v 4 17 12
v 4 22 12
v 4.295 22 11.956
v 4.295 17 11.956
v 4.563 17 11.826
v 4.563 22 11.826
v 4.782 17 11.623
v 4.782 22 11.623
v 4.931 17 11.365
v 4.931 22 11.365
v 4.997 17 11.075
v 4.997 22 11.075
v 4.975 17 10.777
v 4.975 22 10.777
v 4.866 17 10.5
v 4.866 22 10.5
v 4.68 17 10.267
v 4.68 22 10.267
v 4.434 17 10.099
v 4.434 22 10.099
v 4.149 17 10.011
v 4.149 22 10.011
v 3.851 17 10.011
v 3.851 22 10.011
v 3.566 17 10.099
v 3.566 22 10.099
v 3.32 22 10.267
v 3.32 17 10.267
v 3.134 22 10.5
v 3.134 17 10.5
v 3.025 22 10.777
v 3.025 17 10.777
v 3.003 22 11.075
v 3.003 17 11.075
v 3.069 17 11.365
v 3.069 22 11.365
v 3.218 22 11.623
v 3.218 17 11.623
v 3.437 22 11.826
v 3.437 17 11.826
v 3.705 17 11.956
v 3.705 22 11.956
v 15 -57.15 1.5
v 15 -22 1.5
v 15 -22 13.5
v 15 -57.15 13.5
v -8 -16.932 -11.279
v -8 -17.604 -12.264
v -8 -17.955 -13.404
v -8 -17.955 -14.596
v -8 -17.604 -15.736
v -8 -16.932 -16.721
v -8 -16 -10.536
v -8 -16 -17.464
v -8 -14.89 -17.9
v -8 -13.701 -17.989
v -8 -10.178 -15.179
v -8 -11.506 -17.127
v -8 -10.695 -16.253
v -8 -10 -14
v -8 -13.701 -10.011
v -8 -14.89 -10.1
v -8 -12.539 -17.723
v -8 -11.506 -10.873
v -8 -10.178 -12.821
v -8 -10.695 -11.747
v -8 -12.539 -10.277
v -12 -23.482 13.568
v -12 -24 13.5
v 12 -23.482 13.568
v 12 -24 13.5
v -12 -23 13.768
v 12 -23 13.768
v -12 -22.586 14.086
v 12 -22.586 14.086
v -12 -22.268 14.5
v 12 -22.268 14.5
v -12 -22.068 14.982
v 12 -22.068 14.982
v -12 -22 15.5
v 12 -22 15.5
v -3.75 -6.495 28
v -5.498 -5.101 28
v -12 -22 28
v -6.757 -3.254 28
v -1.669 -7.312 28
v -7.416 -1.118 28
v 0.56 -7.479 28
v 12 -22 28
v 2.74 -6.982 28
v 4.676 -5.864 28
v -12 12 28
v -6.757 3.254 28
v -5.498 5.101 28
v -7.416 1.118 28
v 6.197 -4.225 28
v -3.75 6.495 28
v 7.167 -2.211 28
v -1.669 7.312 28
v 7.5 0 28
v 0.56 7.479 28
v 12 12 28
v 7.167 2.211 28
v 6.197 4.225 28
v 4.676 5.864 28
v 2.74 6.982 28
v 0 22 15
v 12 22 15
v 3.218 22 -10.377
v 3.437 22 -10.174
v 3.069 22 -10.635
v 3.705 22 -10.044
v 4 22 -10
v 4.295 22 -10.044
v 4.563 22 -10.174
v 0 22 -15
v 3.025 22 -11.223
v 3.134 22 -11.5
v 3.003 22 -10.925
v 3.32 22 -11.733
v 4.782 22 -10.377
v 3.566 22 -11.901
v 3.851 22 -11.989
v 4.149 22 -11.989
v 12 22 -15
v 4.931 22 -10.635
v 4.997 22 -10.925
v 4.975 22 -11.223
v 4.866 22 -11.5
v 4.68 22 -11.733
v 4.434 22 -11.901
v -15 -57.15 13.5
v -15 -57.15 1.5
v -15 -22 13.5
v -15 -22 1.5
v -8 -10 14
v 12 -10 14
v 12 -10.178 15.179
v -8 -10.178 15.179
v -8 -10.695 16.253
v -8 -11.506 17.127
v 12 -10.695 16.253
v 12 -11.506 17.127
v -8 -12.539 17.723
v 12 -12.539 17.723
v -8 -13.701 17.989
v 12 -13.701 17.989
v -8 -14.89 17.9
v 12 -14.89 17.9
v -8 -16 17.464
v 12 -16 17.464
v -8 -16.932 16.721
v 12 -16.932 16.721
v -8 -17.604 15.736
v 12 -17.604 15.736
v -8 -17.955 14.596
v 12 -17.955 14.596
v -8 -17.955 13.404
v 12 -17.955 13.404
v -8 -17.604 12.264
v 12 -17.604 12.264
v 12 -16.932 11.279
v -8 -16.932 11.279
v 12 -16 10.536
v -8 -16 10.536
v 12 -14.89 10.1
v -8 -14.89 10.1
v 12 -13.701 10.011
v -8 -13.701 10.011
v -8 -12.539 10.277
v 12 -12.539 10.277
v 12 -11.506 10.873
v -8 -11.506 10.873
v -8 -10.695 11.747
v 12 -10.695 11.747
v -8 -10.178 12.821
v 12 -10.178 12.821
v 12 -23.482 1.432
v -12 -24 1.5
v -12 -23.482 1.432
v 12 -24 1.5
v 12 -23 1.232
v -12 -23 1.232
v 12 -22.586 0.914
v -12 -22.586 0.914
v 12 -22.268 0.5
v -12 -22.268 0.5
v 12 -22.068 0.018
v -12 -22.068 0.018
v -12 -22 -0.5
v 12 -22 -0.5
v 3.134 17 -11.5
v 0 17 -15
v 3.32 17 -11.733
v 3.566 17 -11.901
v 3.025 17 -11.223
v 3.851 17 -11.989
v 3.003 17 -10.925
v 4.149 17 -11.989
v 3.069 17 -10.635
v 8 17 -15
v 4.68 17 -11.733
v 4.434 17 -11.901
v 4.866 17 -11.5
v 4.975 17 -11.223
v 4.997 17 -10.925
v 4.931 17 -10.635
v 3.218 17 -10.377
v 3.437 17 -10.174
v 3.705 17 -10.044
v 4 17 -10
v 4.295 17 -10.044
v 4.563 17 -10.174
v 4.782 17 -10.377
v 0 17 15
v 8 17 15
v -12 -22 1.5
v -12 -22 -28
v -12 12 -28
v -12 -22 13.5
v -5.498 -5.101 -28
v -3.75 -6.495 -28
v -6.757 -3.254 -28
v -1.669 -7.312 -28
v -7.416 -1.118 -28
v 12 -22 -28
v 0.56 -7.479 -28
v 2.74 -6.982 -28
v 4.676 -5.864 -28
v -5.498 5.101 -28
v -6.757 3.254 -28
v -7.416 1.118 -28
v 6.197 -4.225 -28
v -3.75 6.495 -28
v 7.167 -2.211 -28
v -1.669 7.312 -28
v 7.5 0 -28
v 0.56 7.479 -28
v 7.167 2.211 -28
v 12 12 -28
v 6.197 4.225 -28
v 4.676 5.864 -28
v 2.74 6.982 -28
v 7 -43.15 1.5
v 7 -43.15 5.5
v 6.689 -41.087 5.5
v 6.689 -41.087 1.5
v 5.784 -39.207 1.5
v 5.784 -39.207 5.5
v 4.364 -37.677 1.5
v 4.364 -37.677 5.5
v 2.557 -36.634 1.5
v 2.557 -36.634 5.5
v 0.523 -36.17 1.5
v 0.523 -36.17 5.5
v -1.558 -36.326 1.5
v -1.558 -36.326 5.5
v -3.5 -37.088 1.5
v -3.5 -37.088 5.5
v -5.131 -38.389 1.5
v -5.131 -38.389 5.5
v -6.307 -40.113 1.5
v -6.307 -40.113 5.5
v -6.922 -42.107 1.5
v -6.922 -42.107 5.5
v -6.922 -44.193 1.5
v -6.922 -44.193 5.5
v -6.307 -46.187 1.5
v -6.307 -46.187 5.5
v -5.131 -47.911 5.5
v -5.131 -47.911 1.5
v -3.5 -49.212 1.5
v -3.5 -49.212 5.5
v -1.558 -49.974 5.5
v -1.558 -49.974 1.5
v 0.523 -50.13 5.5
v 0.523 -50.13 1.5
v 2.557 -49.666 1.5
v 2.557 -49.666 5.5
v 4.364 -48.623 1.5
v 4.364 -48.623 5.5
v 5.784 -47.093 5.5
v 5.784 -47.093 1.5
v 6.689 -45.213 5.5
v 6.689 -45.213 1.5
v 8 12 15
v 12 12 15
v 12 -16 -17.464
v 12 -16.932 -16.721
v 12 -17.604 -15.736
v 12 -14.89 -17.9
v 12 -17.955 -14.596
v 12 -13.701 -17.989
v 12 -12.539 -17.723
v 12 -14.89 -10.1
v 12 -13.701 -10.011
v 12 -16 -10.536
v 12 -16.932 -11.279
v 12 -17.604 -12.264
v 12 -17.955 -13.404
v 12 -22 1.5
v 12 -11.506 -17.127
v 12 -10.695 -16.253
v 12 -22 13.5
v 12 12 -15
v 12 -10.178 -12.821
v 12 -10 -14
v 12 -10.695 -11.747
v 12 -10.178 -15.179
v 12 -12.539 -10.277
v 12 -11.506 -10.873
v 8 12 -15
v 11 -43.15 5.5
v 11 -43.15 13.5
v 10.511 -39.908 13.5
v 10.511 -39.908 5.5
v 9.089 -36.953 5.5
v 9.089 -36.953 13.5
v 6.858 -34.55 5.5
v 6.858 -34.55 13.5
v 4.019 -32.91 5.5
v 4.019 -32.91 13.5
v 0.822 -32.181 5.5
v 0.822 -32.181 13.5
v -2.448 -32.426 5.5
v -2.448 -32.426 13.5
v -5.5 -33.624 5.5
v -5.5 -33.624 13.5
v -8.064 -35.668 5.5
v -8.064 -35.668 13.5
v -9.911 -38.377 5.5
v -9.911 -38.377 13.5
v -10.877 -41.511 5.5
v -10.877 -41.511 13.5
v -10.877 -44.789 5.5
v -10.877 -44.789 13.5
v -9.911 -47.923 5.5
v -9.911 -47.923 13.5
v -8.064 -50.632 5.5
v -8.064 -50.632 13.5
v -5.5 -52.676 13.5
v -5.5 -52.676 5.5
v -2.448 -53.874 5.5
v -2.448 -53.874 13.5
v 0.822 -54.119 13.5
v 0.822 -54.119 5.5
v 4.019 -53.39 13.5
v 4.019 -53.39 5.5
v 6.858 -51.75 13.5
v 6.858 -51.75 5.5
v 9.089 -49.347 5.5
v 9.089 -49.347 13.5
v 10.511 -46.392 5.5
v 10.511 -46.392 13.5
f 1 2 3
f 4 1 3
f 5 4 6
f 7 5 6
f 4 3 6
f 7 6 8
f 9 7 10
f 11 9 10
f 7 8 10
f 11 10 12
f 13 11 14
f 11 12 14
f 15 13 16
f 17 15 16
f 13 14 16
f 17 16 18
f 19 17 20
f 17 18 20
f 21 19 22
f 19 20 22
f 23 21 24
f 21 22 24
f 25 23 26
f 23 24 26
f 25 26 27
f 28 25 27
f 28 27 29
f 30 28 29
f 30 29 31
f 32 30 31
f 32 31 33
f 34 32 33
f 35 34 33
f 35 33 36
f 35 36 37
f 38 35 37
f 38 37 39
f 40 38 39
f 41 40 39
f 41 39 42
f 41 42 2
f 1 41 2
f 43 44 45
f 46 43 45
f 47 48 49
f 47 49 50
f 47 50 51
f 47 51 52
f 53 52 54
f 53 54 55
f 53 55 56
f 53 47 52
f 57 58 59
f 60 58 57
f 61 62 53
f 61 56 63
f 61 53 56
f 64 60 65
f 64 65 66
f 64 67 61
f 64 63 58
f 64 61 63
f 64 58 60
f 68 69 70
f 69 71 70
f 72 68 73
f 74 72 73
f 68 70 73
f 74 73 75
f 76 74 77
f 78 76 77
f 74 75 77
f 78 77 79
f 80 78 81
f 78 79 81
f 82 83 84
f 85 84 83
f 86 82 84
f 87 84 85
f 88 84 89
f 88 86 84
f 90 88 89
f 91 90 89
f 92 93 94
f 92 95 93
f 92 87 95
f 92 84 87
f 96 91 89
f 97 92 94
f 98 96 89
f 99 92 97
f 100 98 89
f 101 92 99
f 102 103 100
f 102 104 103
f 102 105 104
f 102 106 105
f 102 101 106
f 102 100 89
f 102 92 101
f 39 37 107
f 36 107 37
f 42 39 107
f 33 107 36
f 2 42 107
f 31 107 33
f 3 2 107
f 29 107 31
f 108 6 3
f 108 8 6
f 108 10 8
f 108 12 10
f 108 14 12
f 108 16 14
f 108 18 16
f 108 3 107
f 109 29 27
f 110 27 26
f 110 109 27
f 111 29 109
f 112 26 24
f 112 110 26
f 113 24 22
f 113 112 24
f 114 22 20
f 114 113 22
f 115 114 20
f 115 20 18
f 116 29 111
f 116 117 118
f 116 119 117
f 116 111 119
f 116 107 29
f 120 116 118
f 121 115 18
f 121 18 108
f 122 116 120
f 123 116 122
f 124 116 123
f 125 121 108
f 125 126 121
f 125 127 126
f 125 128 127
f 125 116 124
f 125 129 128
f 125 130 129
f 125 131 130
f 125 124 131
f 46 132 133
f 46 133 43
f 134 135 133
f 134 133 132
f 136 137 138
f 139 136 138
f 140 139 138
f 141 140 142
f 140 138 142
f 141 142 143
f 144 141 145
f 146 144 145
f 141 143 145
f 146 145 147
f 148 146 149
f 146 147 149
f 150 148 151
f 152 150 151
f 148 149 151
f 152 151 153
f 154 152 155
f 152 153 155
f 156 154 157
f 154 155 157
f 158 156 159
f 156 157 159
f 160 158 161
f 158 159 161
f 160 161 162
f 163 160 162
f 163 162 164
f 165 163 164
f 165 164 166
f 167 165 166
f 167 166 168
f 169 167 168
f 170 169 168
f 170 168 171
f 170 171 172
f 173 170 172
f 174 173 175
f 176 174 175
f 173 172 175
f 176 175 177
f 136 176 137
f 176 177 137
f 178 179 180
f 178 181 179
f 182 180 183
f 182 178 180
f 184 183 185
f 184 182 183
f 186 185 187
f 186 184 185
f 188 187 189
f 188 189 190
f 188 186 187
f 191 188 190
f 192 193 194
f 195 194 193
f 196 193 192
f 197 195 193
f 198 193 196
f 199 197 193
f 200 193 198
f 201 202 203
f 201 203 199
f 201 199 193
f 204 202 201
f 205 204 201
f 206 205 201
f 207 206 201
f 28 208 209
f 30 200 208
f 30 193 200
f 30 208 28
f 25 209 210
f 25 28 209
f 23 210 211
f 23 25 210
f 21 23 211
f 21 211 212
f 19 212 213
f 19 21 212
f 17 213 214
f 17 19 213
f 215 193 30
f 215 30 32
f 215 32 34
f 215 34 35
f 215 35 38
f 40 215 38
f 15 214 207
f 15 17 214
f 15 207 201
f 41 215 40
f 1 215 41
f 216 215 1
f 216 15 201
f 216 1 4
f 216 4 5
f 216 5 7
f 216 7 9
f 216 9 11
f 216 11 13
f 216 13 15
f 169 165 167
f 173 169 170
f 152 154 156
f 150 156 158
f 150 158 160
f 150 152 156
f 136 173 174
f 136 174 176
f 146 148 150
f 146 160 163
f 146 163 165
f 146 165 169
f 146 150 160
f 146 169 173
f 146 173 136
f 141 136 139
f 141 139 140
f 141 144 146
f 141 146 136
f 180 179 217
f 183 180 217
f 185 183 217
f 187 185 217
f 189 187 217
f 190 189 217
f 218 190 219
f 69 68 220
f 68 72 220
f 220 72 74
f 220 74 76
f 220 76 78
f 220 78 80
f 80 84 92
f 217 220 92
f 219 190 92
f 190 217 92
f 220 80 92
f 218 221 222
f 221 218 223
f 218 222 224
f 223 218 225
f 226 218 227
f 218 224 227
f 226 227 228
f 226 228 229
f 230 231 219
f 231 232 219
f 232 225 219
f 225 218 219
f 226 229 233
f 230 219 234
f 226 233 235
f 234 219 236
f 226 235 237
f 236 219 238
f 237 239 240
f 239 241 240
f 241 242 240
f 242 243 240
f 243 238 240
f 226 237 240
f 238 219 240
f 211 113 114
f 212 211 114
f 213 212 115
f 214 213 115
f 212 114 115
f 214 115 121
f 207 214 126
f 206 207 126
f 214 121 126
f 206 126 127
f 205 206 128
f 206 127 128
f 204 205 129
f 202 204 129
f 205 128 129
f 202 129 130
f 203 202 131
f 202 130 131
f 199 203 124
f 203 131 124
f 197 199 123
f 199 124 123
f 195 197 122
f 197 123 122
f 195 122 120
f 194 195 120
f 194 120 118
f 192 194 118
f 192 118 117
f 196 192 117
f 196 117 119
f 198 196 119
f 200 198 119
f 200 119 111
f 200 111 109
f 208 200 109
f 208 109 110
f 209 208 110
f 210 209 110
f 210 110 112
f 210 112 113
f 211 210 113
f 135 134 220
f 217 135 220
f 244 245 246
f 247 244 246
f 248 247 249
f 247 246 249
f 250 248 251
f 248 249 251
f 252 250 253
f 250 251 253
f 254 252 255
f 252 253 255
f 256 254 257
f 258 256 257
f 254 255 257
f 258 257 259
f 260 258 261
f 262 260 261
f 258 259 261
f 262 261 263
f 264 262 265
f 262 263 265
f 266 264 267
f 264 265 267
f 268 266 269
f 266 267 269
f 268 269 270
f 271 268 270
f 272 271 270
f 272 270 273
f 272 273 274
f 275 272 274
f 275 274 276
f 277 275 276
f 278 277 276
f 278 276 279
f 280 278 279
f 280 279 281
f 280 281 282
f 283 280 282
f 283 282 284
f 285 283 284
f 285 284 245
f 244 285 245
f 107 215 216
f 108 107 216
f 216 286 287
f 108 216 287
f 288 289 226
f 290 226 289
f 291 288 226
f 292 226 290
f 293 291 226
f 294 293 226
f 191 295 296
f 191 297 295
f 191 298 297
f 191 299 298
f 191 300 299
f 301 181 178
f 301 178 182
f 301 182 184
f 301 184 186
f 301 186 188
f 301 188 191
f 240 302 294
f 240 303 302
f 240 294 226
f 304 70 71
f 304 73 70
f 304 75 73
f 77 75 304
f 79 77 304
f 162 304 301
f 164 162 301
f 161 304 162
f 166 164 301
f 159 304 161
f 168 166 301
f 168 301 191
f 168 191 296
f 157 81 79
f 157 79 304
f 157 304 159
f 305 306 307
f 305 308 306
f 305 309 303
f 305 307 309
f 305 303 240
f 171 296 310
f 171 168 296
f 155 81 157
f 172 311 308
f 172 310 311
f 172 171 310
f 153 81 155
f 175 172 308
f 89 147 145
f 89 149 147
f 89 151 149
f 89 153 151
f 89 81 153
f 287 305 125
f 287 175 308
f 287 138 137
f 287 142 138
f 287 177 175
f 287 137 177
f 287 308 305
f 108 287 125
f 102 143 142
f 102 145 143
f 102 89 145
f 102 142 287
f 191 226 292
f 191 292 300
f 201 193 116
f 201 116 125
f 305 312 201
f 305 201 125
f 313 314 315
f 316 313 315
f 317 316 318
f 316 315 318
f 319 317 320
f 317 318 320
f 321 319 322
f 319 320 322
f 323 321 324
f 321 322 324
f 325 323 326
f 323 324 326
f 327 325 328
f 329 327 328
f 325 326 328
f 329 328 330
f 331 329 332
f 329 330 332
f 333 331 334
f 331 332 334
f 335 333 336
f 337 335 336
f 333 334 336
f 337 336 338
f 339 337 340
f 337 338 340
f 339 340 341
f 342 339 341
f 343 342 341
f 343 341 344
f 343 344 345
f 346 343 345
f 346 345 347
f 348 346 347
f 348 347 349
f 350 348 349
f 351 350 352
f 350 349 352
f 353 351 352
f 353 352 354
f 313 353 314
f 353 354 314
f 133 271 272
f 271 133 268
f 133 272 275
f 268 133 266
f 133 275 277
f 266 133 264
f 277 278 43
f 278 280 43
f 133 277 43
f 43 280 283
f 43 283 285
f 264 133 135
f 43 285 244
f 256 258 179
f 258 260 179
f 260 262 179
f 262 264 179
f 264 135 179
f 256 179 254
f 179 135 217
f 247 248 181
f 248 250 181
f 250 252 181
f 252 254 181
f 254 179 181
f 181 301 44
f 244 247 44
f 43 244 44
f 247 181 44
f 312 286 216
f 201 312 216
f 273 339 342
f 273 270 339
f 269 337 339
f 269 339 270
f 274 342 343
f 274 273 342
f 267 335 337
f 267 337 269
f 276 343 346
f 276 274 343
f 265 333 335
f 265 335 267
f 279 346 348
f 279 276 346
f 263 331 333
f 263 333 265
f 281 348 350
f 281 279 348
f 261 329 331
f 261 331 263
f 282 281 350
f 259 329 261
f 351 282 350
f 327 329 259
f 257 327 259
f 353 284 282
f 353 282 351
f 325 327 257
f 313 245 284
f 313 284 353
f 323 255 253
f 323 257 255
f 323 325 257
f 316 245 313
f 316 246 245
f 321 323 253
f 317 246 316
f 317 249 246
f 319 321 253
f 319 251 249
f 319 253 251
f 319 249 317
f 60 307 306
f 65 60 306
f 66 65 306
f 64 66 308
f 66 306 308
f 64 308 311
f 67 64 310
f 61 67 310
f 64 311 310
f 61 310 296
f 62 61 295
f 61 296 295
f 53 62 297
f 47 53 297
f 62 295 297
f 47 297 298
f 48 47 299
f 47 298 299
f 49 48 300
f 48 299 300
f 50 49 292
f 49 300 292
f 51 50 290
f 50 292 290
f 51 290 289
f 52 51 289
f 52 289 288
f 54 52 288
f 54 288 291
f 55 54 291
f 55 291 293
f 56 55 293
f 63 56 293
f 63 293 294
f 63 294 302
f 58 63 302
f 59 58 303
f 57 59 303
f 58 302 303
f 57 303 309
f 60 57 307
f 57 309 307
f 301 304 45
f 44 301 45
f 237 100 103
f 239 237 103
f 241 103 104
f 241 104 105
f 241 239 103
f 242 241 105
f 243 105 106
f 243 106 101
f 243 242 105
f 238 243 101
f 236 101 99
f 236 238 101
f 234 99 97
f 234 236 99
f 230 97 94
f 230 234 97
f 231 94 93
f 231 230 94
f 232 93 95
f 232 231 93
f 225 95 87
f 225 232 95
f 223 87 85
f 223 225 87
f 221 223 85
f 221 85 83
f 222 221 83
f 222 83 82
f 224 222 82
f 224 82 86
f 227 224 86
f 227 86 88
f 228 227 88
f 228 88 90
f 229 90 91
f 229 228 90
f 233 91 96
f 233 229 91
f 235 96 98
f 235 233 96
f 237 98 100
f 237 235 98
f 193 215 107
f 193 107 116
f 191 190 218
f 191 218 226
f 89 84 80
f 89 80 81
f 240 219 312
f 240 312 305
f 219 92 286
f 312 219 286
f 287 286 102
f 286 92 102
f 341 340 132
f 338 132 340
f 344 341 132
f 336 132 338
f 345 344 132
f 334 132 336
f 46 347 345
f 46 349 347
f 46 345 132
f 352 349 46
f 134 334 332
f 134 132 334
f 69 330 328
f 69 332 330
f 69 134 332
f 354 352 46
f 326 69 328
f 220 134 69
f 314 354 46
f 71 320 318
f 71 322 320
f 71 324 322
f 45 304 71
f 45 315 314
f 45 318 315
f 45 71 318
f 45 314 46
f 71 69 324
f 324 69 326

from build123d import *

# Parameters (mm, degrees)
SKETCH1_W           = 24
SKETCH1_H           = 34
SKETCH1_R           = 7.5
BOSS_EXTRUDE1_DEPTH = 28
SKETCH3_W           = 30
SKETCH3_H           = 12
BOSS_EXTRUDE2_DEPTH = 35.15
SKETCH4_R           = 11
CUT_EXTRUDE2_DEPTH  = 8
FILLET1_R           = 2
SKETCH5_W           = 12
SKETCH5_H           = 30
BOSS_EXTRUDE3_DEPTH = 10
SKETCH6_W           = 8
SKETCH6_H           = 5
CUT_EXTRUDE3_DEPTH  = 74.076141797
CUT_EXTRUDE4_REACH  = 87.286
SKETCH7_R           = 1
SKETCH8_R           = 4
CUT_EXTRUDE5_DEPTH  = 20
SKETCH9_R           = 7
CUT_EXTRUDE6_DEPTH  = 10


with BuildPart() as part:
    # Sketch1 → Boss-Extrude1 (new, symmetric)
    with BuildSketch(Plane.XY):
        with Locations((0, -5)):
            Rectangle(SKETCH1_W, SKETCH1_H)
        Circle(SKETCH1_R, mode=Mode.SUBTRACT)
    extrude(amount=BOSS_EXTRUDE1_DEPTH, both=True)

    # Sketch3 → Boss-Extrude2 (add)
    with BuildSketch(Plane.XZ.offset(22)):
        with Locations((0, 7.5)):
            Rectangle(SKETCH3_W, SKETCH3_H)
    extrude(amount=BOSS_EXTRUDE2_DEPTH)

    # Sketch4 → Cut-Extrude2 (cut)
    with BuildSketch(Plane.XY.offset(13.5)):
        with Locations((0, -43.15)):
            Circle(SKETCH4_R)
    extrude(amount=-CUT_EXTRUDE2_DEPTH, mode=Mode.SUBTRACT)

    # Fillet1
    fillet1_edges = [part.edges().sort_by_distance(p)[0] for p in [
        (0, -22, 1.5),
        (0, -22, 13.5),
    ]]
    fillet(fillet1_edges, radius=FILLET1_R)

    # Sketch5 → Boss-Extrude3 (add)
    with BuildSketch(Plane(origin=(0, 12, 0), x_dir=(1, 0, 0), z_dir=(0, 1, 0))):
        with Locations((6, 0)):
            Rectangle(SKETCH5_W, SKETCH5_H)
    extrude(amount=BOSS_EXTRUDE3_DEPTH)

    # Sketch6 → Cut-Extrude3 (cut, through all)
    with BuildSketch(Plane.XY.offset(15)):
        with Locations((4, 14.5)):
            Rectangle(SKETCH6_W, SKETCH6_H)
    extrude(amount=-CUT_EXTRUDE3_DEPTH, mode=Mode.SUBTRACT)

    # Sketch7 → Cut-Extrude4 (cut, up to next)
    with BuildSketch(Plane(origin=(0, 22, 0), x_dir=(1, 0, 0), z_dir=(0, 1, 0)), mode=Mode.PRIVATE) as cut_extrude4_sk1:
        with Locations(Location((4, 11, 0), (0, 0, 270))):
            Circle(SKETCH7_R)
    cut_extrude4_tool1 = extrude(cut_extrude4_sk1.sketch, amount=-CUT_EXTRUDE4_REACH, mode=Mode.PRIVATE) & part.part
    # Sketch7 → Cut-Extrude4 (cut, up to next)
    with BuildSketch(Plane(origin=(0, 22, 0), x_dir=(1, 0, 0), z_dir=(0, 1, 0)), mode=Mode.PRIVATE) as cut_extrude4_sk2:
        with Locations(Location((4, -11, 0), (0, 0, 270))):
            Circle(SKETCH7_R)
    cut_extrude4_tool2 = extrude(cut_extrude4_sk2.sketch, amount=-CUT_EXTRUDE4_REACH, mode=Mode.PRIVATE) & part.part
    add(cut_extrude4_tool1.solids().sort_by_distance((4, 22, -11))[0], mode=Mode.SUBTRACT)
    add(cut_extrude4_tool2.solids().sort_by_distance((4, 22, 11))[0], mode=Mode.SUBTRACT)

    # Sketch8 → Cut-Extrude5 (cut)
    with BuildSketch(Plane(origin=(12, 0, 0), x_dir=(0, 0, -1), z_dir=(1, 0, 0))):
        with Locations(Location((-14, -14, 0), (0, 0, 90))):
            Circle(SKETCH8_R)
        with Locations(Location((14, -14, 0), (0, 0, 90))):
            Circle(SKETCH8_R)
    extrude(amount=-CUT_EXTRUDE5_DEPTH, mode=Mode.SUBTRACT)

    # Sketch9 → Cut-Extrude6 (cut)
    with BuildSketch(Plane.XY.offset(5.5)):
        with Locations((0, -43.15)):
            Circle(SKETCH9_R)
    extrude(amount=-CUT_EXTRUDE6_DEPTH, mode=Mode.SUBTRACT)


solid = part.part
